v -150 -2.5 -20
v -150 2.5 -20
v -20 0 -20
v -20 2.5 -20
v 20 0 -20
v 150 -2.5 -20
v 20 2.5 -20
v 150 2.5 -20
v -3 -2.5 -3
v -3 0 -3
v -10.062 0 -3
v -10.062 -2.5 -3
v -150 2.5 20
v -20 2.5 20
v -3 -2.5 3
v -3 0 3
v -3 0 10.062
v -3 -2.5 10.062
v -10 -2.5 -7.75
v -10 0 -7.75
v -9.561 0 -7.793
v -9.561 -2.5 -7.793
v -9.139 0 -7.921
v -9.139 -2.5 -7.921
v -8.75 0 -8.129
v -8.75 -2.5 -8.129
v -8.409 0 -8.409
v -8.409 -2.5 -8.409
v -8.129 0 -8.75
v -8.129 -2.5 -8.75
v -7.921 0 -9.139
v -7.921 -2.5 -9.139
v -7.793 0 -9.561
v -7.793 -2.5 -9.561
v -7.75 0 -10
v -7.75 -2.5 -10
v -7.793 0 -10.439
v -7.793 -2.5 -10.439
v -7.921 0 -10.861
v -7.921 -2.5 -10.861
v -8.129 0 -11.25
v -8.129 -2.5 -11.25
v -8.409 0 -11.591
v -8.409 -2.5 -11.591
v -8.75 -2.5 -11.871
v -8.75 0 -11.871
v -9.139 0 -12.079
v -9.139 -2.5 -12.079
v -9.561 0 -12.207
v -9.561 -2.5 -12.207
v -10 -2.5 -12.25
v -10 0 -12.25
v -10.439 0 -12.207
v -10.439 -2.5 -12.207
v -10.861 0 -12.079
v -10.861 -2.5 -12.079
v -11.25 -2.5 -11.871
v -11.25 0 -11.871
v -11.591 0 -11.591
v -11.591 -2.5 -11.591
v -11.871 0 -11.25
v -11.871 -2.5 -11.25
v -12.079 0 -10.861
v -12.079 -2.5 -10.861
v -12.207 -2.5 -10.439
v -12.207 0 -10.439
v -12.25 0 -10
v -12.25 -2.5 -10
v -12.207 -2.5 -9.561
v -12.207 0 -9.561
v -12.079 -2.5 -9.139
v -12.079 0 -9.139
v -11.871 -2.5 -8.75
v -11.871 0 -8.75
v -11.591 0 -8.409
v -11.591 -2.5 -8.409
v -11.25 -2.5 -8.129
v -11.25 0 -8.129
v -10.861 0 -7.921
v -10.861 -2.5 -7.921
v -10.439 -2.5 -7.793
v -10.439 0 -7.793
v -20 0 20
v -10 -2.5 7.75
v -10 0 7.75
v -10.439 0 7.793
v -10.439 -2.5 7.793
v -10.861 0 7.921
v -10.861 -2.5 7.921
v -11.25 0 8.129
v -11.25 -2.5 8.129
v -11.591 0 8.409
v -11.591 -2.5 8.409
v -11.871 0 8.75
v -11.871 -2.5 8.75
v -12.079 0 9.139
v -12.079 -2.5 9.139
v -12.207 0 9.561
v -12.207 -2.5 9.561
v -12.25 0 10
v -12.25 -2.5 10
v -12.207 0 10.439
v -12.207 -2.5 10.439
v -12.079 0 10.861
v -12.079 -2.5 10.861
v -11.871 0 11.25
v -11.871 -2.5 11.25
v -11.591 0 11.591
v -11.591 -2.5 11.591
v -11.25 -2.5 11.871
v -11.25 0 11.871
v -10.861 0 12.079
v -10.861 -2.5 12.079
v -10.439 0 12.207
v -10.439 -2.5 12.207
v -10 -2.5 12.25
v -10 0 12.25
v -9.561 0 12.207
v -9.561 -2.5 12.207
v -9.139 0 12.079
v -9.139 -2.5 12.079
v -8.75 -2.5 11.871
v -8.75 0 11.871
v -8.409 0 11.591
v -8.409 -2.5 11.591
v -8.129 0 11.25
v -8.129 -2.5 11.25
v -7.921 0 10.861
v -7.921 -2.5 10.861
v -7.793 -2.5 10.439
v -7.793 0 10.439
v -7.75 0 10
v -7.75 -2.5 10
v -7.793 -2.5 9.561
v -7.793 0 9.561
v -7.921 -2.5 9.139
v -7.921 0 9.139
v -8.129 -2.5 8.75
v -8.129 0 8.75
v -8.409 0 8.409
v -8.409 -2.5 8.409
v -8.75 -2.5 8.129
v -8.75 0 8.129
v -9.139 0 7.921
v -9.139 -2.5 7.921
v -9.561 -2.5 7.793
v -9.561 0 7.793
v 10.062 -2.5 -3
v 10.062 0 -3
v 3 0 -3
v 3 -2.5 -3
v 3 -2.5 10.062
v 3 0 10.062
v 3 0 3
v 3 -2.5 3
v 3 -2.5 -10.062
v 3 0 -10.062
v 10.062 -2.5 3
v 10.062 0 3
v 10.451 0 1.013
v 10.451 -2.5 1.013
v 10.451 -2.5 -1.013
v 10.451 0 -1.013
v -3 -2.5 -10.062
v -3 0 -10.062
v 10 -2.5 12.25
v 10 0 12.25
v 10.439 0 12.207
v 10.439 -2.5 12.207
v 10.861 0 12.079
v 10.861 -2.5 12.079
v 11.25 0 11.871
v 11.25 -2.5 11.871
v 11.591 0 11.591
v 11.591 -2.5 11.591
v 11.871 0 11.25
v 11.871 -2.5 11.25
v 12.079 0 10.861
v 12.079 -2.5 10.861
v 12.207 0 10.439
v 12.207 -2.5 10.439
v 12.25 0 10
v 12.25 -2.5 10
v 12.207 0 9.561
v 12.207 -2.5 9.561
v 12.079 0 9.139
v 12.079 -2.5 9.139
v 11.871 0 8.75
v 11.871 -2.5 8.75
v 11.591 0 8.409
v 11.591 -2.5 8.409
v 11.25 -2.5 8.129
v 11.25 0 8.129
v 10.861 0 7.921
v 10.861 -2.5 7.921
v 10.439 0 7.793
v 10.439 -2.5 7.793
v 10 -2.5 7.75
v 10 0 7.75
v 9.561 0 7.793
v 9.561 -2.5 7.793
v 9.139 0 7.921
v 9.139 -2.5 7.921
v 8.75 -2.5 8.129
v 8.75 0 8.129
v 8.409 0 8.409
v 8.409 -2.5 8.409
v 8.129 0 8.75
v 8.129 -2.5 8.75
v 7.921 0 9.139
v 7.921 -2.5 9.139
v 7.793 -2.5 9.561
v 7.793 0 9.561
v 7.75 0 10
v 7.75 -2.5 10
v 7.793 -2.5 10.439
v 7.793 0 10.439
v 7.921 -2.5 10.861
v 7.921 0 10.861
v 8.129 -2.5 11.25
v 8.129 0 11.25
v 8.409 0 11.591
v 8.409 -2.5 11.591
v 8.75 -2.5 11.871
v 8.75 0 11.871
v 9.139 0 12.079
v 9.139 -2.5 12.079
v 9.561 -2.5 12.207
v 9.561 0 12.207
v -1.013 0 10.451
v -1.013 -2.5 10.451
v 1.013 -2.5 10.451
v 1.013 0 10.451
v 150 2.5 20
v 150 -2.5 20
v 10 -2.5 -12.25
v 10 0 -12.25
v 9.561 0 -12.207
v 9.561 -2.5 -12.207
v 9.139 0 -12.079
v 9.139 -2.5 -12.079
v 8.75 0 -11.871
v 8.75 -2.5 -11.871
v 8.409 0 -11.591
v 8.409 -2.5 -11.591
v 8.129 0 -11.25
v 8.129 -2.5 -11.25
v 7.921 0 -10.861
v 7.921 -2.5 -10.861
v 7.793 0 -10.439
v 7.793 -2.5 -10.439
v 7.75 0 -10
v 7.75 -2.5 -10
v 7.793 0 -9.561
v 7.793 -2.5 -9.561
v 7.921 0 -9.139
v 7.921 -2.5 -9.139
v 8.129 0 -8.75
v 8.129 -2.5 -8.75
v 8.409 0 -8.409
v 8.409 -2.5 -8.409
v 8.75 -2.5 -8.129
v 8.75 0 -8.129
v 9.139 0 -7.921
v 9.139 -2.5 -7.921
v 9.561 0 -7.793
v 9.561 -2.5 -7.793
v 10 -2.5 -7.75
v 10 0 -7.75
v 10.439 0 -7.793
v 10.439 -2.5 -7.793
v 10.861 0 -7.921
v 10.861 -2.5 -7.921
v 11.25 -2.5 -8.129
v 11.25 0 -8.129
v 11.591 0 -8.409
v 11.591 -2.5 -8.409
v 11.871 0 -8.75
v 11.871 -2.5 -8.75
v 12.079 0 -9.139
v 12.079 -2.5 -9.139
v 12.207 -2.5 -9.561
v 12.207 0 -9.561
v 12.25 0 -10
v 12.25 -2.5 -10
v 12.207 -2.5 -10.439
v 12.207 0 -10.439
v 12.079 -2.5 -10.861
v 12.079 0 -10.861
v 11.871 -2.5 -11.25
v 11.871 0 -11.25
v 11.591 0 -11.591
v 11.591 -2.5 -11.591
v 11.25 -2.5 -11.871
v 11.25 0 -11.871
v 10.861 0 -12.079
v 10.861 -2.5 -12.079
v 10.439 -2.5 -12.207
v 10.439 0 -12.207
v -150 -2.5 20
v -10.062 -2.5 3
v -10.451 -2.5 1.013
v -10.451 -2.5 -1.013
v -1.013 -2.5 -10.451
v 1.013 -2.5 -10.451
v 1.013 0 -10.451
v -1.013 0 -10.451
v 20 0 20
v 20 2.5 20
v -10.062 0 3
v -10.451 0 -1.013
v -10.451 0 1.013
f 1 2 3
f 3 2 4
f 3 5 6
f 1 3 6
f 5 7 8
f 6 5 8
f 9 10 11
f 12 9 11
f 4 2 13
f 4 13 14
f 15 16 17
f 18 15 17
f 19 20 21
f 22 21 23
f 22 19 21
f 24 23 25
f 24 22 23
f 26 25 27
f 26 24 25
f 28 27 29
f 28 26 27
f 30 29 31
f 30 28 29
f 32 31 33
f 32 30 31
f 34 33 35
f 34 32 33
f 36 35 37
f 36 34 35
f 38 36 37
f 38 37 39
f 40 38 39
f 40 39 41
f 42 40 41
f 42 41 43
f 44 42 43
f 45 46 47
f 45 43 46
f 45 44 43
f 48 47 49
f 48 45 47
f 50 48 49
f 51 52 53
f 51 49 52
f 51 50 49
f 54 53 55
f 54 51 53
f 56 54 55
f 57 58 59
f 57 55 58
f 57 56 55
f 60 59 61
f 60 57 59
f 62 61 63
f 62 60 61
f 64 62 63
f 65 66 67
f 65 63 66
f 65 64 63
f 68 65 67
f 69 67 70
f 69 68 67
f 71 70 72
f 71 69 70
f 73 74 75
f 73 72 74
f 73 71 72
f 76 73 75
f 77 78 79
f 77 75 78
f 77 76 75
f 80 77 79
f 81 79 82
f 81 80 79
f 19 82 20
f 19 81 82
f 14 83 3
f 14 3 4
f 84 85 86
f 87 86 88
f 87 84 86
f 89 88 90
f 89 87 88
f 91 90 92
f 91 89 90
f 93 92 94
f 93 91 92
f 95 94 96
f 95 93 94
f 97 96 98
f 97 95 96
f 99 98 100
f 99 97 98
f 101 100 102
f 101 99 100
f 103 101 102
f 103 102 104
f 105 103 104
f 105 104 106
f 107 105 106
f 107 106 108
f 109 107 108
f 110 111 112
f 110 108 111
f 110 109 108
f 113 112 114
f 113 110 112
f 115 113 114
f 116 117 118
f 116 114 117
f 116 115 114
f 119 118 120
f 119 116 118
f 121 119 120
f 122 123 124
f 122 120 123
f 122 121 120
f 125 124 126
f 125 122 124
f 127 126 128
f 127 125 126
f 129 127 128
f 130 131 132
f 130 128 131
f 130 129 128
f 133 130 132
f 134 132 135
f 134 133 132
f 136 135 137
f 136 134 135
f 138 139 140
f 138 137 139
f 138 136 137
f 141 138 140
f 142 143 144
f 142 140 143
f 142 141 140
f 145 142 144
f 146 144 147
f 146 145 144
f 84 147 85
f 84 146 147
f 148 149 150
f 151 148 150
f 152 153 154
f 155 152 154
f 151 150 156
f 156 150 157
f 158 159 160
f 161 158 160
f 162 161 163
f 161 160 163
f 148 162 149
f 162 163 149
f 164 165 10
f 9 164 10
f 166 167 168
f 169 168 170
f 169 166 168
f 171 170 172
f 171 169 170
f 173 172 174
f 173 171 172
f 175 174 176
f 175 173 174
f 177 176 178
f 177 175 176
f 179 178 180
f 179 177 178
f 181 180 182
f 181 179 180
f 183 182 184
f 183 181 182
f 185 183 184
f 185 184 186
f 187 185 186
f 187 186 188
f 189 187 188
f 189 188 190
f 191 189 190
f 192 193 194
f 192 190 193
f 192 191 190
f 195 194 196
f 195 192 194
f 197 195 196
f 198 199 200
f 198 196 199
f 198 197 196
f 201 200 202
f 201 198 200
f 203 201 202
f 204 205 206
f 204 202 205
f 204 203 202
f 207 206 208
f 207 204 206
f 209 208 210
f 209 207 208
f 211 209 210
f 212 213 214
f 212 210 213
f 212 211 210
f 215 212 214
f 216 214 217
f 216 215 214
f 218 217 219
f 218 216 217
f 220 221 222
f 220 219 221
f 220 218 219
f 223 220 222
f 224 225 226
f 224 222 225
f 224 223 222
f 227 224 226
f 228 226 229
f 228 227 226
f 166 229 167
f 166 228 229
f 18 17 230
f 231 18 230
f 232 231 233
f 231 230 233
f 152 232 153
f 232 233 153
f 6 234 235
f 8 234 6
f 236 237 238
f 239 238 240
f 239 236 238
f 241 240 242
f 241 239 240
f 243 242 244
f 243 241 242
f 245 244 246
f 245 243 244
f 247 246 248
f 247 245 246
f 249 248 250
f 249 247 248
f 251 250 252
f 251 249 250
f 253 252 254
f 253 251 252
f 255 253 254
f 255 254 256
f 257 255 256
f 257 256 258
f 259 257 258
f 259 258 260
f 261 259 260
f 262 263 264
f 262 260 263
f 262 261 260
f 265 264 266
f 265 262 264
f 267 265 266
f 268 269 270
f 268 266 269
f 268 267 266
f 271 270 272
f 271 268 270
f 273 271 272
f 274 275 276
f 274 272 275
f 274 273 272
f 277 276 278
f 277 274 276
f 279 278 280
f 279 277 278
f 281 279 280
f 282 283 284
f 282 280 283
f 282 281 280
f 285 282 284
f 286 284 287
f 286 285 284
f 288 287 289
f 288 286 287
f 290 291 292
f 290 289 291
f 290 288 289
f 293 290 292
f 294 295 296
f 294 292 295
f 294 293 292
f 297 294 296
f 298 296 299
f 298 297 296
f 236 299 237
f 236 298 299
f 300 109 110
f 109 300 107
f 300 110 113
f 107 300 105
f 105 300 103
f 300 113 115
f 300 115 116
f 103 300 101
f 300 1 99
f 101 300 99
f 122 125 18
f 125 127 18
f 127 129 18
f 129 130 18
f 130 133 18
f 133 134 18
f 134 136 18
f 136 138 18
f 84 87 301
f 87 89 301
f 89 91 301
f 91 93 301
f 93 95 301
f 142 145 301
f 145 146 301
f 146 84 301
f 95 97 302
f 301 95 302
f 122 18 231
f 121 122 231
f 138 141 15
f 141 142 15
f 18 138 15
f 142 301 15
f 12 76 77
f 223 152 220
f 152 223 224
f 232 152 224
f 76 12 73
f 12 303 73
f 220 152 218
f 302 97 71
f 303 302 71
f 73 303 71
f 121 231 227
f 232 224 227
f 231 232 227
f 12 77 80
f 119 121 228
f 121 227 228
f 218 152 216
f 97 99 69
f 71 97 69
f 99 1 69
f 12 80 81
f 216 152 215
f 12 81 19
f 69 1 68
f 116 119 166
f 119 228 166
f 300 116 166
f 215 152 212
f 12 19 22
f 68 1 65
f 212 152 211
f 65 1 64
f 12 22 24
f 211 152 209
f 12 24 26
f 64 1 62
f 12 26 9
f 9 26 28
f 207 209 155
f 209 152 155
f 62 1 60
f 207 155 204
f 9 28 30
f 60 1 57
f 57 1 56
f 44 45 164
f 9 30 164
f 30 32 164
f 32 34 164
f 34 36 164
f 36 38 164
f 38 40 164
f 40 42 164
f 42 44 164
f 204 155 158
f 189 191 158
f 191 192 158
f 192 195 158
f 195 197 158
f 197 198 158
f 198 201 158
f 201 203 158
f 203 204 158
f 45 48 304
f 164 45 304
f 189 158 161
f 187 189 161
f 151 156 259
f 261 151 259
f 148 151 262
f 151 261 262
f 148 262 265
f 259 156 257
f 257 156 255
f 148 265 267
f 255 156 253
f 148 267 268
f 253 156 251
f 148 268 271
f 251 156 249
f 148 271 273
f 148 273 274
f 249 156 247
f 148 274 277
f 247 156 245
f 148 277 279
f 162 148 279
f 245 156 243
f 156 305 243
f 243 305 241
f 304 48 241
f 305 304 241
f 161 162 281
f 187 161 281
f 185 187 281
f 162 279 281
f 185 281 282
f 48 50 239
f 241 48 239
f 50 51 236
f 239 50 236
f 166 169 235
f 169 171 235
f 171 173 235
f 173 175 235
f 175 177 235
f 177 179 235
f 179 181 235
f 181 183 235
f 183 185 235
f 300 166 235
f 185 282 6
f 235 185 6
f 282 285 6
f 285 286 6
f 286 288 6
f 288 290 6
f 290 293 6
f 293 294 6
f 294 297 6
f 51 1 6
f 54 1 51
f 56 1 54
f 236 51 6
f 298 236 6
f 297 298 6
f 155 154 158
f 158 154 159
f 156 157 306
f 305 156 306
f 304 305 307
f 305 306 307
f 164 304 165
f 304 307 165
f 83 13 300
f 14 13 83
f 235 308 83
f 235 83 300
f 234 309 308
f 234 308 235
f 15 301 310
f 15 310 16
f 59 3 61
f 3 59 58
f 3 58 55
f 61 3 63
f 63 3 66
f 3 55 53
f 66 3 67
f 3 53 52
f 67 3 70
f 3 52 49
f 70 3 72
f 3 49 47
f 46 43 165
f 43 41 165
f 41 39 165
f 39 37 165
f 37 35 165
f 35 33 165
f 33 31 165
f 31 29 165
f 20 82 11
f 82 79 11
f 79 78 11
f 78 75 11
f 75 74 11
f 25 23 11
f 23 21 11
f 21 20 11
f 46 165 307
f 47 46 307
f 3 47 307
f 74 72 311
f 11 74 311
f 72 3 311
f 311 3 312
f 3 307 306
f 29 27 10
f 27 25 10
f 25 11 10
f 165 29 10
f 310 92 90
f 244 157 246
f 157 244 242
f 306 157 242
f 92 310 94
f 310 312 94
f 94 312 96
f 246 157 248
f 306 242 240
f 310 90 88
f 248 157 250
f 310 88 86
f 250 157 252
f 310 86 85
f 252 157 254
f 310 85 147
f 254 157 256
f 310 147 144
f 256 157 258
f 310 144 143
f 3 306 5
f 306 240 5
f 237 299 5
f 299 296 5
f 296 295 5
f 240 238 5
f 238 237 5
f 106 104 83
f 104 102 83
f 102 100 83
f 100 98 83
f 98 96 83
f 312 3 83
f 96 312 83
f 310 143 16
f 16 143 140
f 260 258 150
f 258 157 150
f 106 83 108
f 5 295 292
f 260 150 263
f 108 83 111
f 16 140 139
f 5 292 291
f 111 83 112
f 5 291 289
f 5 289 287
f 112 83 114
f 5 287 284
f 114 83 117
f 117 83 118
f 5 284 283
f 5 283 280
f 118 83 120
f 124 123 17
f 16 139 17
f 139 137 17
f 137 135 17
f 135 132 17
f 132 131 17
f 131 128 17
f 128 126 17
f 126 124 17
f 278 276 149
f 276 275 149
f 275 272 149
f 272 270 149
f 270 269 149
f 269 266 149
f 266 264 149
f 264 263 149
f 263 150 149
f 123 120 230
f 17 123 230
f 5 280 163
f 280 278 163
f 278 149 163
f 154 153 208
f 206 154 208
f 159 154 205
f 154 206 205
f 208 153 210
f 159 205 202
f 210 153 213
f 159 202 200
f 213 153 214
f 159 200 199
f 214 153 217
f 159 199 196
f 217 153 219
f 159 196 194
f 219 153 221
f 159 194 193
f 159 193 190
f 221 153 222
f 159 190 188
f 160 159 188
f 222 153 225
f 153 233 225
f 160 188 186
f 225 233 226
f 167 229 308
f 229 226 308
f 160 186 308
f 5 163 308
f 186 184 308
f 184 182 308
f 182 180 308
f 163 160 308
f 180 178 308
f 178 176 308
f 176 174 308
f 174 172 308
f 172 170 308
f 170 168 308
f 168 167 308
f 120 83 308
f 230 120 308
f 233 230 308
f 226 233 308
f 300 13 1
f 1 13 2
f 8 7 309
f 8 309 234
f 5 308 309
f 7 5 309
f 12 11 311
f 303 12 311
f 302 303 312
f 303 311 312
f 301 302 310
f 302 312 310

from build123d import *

# Parameters (mm, degrees)
SKETCH1_W           = 300
SKETCH1_H           = 40
SKETCH1_R           = 2.25
BOSS_EXTRUDE1_DEPTH = 2.5
SKETCH2_W           = 40
SKETCH2_H           = 2.5
CUT_EXTRUDE1_DEPTH  = 156.261875552


with BuildPart() as part:
    # Sketch1 → Boss-Extrude1 (new, symmetric)
    with BuildSketch(Plane(origin=(0, 0, 0), x_dir=(1, 0, 0), z_dir=(0, 1, 0))):
        Rectangle(SKETCH1_W, SKETCH1_H)
        with Locations(Location((10, -10, 0), (0, 0, 270))):
            Circle(SKETCH1_R, mode=Mode.SUBTRACT)
        with Locations(Location((10, 10, 0), (0, 0, 90))):
            Circle(SKETCH1_R, mode=Mode.SUBTRACT)
        with Locations(Location((-10, -10, 0), (0, 0, 90))):
            Circle(SKETCH1_R, mode=Mode.SUBTRACT)
        with Locations(Location((-10, 10, 0), (0, 0, 270))):
            Circle(SKETCH1_R, mode=Mode.SUBTRACT)
        with BuildLine():
            Line((-3, -3), (-3, -10.062305899))
            ThreePointArc((-3, -10.062305899), (0, -10.5), (3, -10.062305899))
            Line((3, -10.062305899), (3, -3))
            Line((3, -3), (10.062305899, -3))
            ThreePointArc((10.062305899, -3), (10.5, 0), (10.062305899, 3))
            Line((10.062305899, 3), (3, 3))
            Line((3, 3), (3, 10.062305899))
            ThreePointArc((3, 10.062305899), (0, 10.5), (-3, 10.062305899))
            Line((-3, 10.062305899), (-3, 3))
            Line((-3, 3), (-10.062305899, 3))
            ThreePointArc((-10.062305899, 3), (-10.5, 0), (-10.062305899, -3))
            Line((-10.062305899, -3), (-3, -3))
        make_face(mode=Mode.SUBTRACT)
    extrude(amount=BOSS_EXTRUDE1_DEPTH, both=True)

    # Sketch2 → Cut-Extrude1 (cut, through all)
    with BuildSketch(Plane.XY.offset(20)):
        with Locations((0, 1.25)):
            Rectangle(SKETCH2_W, SKETCH2_H)
    extrude(amount=-CUT_EXTRUDE1_DEPTH, mode=Mode.SUBTRACT)


solid = part.part
